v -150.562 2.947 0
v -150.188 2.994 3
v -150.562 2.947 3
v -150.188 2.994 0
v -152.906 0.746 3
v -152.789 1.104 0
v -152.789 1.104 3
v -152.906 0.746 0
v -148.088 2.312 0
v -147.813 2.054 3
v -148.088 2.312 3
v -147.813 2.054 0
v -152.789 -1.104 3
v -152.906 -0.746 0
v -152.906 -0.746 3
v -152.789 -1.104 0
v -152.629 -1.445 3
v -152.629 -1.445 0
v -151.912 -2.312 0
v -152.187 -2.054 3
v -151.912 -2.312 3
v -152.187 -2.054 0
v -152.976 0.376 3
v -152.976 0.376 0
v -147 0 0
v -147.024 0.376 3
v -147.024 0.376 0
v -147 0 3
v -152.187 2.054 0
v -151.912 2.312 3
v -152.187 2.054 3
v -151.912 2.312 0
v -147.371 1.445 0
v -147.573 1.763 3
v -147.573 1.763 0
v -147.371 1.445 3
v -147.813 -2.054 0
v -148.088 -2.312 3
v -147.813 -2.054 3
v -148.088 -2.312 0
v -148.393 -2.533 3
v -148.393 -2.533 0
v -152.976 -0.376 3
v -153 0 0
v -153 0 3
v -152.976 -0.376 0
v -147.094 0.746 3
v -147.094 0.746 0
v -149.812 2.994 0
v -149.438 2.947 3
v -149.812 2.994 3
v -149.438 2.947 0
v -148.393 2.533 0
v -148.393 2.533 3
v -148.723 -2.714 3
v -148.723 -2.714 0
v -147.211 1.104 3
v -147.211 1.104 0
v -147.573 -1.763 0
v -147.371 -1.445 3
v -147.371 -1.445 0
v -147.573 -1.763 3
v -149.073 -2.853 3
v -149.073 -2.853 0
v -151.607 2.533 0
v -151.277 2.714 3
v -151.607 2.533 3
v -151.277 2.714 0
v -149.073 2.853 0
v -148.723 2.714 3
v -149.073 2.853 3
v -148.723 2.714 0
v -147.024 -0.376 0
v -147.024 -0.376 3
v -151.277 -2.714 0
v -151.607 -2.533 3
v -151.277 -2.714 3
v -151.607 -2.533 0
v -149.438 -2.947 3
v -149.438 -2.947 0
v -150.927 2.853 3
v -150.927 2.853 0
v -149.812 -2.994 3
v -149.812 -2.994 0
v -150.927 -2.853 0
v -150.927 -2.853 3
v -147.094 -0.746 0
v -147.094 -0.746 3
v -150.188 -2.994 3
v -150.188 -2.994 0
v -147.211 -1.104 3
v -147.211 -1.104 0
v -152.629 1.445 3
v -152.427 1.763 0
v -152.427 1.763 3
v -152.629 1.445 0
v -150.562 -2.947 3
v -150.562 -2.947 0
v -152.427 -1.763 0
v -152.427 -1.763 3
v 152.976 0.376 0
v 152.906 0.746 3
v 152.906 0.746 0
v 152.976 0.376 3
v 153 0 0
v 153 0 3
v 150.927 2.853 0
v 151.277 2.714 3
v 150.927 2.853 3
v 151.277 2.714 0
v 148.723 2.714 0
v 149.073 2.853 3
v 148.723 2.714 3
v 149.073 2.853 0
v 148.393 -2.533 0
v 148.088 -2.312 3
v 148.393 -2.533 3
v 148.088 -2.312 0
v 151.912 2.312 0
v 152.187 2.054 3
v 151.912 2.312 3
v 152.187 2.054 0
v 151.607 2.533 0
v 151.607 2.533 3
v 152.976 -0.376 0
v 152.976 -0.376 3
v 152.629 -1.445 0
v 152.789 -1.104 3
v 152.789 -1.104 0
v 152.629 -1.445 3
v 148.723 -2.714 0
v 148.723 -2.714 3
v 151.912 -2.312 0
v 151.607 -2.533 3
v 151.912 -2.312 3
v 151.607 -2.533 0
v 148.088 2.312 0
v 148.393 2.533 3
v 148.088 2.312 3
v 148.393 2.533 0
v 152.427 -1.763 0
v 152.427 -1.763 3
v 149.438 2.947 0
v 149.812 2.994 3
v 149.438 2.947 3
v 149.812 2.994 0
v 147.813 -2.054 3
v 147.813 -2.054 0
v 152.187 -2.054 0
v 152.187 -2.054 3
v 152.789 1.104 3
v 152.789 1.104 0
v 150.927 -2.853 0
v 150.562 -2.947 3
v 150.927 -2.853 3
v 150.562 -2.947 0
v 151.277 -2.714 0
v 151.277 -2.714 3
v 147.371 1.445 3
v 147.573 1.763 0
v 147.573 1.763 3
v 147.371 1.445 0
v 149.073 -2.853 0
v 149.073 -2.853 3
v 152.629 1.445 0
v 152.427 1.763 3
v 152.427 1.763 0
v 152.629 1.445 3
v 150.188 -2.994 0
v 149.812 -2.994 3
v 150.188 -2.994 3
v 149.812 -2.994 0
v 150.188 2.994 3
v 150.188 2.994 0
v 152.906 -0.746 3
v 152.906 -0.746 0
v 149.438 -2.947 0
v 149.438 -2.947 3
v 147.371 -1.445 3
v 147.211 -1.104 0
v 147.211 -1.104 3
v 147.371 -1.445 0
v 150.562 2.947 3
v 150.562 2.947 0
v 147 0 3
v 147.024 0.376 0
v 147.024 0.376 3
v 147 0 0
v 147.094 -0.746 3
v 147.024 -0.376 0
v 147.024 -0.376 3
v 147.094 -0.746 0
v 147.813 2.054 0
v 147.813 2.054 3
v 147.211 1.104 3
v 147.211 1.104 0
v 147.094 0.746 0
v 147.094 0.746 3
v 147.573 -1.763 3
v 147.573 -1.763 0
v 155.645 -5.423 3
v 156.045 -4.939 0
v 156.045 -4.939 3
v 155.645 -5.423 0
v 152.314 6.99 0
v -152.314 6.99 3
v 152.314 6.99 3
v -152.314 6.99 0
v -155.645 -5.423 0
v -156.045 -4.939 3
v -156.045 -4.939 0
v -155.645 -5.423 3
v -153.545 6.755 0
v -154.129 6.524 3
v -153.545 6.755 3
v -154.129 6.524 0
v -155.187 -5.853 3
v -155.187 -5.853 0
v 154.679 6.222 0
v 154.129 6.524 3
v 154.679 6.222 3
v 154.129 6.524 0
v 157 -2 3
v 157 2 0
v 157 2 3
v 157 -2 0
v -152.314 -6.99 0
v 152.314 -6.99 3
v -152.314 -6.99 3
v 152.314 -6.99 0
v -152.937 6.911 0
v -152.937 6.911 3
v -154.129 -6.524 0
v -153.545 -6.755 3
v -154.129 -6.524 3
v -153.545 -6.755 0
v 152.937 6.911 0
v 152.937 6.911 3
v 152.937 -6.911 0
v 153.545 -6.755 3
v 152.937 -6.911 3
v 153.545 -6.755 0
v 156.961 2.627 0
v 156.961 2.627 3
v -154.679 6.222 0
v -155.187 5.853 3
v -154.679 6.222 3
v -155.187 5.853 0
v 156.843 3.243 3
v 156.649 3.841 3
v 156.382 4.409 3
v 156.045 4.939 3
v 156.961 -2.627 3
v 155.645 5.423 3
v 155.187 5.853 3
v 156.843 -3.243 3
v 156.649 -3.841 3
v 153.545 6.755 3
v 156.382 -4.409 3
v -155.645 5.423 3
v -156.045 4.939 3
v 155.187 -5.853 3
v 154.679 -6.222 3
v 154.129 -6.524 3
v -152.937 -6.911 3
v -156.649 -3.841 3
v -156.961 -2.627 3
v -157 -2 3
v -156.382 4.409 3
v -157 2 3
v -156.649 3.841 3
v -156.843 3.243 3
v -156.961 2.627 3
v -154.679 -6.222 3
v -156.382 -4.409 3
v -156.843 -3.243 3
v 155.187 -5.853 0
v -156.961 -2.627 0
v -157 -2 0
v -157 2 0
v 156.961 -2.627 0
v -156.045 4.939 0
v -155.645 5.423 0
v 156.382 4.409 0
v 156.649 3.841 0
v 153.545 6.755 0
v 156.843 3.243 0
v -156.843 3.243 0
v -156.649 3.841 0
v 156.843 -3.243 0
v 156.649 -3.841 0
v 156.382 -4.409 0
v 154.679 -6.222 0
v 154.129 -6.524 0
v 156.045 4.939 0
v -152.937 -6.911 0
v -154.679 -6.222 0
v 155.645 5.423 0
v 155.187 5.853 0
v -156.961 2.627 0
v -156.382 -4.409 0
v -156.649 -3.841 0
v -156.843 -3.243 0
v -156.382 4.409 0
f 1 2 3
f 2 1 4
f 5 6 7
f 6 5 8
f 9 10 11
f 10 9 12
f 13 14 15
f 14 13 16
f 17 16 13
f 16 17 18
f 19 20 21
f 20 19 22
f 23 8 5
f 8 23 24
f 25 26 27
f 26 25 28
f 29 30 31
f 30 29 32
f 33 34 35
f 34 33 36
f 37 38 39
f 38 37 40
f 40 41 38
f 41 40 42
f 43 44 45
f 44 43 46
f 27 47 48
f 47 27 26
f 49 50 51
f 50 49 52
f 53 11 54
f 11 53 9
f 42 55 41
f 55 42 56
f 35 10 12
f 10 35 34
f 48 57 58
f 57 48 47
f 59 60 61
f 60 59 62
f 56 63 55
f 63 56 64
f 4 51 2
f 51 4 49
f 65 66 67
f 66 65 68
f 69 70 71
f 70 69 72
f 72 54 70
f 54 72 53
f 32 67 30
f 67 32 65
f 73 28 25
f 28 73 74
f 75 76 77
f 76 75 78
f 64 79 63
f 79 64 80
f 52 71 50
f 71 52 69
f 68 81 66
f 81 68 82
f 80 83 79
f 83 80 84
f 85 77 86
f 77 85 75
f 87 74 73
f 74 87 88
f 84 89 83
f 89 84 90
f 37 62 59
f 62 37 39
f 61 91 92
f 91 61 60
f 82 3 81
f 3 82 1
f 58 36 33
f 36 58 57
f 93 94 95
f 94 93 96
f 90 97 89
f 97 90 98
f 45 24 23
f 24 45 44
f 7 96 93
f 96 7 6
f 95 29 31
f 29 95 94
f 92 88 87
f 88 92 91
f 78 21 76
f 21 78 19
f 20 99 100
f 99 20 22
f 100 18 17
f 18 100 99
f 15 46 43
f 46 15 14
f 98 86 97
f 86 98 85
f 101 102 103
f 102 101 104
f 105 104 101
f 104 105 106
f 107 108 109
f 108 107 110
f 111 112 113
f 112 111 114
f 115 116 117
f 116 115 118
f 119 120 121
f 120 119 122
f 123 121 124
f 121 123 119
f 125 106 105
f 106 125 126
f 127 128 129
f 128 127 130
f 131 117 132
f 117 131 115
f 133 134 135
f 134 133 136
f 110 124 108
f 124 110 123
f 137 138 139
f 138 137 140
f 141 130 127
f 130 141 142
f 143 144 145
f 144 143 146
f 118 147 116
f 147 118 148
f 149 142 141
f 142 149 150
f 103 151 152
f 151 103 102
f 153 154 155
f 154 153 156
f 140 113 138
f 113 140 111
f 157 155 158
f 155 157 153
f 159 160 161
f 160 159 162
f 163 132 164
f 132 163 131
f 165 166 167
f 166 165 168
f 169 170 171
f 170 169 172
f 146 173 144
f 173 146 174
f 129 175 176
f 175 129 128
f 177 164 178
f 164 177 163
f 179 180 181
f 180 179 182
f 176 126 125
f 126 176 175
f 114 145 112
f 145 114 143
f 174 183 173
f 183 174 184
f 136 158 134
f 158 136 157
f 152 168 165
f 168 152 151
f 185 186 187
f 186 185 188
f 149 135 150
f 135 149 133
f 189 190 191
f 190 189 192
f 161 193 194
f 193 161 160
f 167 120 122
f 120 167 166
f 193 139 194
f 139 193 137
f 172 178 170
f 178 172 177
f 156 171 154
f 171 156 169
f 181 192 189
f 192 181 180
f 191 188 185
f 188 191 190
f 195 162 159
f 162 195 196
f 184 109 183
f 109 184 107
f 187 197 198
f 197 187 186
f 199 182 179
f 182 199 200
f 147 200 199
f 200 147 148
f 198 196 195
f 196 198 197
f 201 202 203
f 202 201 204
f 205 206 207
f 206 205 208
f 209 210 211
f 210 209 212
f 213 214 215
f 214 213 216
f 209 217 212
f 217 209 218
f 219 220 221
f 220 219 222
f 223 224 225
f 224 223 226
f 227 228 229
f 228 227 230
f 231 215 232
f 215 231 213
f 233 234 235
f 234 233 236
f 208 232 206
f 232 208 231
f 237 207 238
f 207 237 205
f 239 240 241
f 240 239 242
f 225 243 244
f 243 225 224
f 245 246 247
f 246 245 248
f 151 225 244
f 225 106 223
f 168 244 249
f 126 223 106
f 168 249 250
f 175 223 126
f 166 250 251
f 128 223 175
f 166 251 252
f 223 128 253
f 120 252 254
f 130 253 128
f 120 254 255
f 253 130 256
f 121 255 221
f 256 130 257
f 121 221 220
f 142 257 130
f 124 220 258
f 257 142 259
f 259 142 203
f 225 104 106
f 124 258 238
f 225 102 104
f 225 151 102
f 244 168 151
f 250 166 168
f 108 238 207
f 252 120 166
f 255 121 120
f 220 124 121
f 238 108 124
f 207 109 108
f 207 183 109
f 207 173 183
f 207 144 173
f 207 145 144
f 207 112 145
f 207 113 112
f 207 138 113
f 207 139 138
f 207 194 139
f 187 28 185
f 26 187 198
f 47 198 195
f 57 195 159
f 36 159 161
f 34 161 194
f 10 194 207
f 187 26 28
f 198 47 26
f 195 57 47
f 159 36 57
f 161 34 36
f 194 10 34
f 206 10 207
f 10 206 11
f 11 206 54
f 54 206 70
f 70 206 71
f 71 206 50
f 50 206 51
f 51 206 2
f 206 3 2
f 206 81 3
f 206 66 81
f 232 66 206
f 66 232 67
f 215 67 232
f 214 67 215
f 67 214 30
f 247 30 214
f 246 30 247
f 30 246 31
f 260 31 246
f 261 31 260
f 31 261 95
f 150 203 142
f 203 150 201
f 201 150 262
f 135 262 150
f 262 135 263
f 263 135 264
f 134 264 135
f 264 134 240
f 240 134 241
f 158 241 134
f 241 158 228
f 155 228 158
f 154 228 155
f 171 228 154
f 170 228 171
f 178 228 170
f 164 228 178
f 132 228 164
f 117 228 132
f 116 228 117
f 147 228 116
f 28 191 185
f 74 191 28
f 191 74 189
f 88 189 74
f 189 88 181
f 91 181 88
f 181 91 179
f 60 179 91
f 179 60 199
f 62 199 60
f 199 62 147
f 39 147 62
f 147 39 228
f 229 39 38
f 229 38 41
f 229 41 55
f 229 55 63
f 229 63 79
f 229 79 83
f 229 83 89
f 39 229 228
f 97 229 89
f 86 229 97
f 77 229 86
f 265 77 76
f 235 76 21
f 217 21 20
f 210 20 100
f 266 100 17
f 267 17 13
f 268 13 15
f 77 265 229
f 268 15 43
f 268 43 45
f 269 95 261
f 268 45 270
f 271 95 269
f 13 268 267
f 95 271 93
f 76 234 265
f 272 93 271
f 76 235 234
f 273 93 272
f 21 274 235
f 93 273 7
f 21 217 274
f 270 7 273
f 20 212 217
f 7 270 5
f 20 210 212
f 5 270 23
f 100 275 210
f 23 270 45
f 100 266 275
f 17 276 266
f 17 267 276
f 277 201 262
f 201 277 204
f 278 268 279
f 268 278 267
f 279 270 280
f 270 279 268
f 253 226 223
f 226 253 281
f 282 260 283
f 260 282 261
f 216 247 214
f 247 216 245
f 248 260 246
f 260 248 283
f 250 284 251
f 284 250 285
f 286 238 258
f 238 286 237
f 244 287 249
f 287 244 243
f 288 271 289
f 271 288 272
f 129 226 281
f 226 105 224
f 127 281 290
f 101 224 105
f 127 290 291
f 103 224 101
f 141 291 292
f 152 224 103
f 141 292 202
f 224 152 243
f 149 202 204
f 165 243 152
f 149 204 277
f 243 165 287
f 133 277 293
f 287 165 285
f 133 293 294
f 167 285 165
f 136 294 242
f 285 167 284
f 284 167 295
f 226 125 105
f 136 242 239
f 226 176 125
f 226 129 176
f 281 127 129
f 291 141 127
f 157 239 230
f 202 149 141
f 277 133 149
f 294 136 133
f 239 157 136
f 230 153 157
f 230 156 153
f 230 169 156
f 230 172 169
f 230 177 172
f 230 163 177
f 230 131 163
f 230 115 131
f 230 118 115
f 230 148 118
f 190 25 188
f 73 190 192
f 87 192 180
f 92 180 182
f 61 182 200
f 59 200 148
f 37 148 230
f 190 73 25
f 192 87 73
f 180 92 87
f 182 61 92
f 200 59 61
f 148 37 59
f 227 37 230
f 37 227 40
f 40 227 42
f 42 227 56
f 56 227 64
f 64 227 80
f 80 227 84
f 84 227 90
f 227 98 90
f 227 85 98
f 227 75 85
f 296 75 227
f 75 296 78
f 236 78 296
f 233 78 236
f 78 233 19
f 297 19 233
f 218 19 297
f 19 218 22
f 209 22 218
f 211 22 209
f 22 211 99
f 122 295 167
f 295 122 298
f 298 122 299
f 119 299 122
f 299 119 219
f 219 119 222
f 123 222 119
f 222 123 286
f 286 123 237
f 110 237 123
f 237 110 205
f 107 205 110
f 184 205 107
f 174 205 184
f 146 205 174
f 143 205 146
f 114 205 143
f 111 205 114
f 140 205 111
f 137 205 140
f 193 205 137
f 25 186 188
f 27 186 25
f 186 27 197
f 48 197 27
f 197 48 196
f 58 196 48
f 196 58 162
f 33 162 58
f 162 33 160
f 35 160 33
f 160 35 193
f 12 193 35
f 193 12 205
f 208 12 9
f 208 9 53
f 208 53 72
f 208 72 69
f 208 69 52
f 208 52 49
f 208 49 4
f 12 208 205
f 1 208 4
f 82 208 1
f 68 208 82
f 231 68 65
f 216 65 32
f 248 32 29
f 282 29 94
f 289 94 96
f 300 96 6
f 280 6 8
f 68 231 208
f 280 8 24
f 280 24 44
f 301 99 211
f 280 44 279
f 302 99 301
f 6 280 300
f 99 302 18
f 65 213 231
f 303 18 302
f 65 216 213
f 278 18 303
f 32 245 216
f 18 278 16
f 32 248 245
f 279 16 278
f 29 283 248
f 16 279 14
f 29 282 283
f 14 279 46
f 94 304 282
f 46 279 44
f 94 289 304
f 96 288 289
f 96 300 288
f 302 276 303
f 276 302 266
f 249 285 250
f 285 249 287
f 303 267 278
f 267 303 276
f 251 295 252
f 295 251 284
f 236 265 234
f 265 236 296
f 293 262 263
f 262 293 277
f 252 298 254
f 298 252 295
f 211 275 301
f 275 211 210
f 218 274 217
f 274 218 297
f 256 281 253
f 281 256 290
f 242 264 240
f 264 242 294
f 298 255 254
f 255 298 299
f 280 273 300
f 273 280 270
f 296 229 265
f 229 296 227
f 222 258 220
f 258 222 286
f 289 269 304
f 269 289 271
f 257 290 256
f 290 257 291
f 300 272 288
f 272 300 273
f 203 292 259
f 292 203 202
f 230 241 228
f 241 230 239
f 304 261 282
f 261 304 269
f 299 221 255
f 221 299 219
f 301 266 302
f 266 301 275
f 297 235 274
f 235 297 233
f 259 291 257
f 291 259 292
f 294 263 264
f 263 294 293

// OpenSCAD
$fn = 50;


difference() {
	union() {
		hull() {
			translate(v = [-152.0000000000, 2.0000000000, 0]) {
				cylinder(h = 3, r = 5);
			}
			translate(v = [152.0000000000, 2.0000000000, 0]) {
				cylinder(h = 3, r = 5);
			}
			translate(v = [-152.0000000000, -2.0000000000, 0]) {
				cylinder(h = 3, r = 5);
			}
			translate(v = [152.0000000000, -2.0000000000, 0]) {
				cylinder(h = 3, r = 5);
			}
		}
	}
	union() {
		translate(v = [-150.0000000000, 0.0000000000, -100.0000000000]) {
			cylinder(h = 200, r = 3.0000000000);
		}
		translate(v = [-150.0000000000, 0.0000000000, -100.0000000000]) {
			cylinder(h = 200, r = 3.0000000000);
		}
		translate(v = [150.0000000000, 0.0000000000, -100.0000000000]) {
			cylinder(h = 200, r = 3.0000000000);
		}
		translate(v = [150.0000000000, 0.0000000000, -100.0000000000]) {
			cylinder(h = 200, r = 3.0000000000);
		}
	}
}
